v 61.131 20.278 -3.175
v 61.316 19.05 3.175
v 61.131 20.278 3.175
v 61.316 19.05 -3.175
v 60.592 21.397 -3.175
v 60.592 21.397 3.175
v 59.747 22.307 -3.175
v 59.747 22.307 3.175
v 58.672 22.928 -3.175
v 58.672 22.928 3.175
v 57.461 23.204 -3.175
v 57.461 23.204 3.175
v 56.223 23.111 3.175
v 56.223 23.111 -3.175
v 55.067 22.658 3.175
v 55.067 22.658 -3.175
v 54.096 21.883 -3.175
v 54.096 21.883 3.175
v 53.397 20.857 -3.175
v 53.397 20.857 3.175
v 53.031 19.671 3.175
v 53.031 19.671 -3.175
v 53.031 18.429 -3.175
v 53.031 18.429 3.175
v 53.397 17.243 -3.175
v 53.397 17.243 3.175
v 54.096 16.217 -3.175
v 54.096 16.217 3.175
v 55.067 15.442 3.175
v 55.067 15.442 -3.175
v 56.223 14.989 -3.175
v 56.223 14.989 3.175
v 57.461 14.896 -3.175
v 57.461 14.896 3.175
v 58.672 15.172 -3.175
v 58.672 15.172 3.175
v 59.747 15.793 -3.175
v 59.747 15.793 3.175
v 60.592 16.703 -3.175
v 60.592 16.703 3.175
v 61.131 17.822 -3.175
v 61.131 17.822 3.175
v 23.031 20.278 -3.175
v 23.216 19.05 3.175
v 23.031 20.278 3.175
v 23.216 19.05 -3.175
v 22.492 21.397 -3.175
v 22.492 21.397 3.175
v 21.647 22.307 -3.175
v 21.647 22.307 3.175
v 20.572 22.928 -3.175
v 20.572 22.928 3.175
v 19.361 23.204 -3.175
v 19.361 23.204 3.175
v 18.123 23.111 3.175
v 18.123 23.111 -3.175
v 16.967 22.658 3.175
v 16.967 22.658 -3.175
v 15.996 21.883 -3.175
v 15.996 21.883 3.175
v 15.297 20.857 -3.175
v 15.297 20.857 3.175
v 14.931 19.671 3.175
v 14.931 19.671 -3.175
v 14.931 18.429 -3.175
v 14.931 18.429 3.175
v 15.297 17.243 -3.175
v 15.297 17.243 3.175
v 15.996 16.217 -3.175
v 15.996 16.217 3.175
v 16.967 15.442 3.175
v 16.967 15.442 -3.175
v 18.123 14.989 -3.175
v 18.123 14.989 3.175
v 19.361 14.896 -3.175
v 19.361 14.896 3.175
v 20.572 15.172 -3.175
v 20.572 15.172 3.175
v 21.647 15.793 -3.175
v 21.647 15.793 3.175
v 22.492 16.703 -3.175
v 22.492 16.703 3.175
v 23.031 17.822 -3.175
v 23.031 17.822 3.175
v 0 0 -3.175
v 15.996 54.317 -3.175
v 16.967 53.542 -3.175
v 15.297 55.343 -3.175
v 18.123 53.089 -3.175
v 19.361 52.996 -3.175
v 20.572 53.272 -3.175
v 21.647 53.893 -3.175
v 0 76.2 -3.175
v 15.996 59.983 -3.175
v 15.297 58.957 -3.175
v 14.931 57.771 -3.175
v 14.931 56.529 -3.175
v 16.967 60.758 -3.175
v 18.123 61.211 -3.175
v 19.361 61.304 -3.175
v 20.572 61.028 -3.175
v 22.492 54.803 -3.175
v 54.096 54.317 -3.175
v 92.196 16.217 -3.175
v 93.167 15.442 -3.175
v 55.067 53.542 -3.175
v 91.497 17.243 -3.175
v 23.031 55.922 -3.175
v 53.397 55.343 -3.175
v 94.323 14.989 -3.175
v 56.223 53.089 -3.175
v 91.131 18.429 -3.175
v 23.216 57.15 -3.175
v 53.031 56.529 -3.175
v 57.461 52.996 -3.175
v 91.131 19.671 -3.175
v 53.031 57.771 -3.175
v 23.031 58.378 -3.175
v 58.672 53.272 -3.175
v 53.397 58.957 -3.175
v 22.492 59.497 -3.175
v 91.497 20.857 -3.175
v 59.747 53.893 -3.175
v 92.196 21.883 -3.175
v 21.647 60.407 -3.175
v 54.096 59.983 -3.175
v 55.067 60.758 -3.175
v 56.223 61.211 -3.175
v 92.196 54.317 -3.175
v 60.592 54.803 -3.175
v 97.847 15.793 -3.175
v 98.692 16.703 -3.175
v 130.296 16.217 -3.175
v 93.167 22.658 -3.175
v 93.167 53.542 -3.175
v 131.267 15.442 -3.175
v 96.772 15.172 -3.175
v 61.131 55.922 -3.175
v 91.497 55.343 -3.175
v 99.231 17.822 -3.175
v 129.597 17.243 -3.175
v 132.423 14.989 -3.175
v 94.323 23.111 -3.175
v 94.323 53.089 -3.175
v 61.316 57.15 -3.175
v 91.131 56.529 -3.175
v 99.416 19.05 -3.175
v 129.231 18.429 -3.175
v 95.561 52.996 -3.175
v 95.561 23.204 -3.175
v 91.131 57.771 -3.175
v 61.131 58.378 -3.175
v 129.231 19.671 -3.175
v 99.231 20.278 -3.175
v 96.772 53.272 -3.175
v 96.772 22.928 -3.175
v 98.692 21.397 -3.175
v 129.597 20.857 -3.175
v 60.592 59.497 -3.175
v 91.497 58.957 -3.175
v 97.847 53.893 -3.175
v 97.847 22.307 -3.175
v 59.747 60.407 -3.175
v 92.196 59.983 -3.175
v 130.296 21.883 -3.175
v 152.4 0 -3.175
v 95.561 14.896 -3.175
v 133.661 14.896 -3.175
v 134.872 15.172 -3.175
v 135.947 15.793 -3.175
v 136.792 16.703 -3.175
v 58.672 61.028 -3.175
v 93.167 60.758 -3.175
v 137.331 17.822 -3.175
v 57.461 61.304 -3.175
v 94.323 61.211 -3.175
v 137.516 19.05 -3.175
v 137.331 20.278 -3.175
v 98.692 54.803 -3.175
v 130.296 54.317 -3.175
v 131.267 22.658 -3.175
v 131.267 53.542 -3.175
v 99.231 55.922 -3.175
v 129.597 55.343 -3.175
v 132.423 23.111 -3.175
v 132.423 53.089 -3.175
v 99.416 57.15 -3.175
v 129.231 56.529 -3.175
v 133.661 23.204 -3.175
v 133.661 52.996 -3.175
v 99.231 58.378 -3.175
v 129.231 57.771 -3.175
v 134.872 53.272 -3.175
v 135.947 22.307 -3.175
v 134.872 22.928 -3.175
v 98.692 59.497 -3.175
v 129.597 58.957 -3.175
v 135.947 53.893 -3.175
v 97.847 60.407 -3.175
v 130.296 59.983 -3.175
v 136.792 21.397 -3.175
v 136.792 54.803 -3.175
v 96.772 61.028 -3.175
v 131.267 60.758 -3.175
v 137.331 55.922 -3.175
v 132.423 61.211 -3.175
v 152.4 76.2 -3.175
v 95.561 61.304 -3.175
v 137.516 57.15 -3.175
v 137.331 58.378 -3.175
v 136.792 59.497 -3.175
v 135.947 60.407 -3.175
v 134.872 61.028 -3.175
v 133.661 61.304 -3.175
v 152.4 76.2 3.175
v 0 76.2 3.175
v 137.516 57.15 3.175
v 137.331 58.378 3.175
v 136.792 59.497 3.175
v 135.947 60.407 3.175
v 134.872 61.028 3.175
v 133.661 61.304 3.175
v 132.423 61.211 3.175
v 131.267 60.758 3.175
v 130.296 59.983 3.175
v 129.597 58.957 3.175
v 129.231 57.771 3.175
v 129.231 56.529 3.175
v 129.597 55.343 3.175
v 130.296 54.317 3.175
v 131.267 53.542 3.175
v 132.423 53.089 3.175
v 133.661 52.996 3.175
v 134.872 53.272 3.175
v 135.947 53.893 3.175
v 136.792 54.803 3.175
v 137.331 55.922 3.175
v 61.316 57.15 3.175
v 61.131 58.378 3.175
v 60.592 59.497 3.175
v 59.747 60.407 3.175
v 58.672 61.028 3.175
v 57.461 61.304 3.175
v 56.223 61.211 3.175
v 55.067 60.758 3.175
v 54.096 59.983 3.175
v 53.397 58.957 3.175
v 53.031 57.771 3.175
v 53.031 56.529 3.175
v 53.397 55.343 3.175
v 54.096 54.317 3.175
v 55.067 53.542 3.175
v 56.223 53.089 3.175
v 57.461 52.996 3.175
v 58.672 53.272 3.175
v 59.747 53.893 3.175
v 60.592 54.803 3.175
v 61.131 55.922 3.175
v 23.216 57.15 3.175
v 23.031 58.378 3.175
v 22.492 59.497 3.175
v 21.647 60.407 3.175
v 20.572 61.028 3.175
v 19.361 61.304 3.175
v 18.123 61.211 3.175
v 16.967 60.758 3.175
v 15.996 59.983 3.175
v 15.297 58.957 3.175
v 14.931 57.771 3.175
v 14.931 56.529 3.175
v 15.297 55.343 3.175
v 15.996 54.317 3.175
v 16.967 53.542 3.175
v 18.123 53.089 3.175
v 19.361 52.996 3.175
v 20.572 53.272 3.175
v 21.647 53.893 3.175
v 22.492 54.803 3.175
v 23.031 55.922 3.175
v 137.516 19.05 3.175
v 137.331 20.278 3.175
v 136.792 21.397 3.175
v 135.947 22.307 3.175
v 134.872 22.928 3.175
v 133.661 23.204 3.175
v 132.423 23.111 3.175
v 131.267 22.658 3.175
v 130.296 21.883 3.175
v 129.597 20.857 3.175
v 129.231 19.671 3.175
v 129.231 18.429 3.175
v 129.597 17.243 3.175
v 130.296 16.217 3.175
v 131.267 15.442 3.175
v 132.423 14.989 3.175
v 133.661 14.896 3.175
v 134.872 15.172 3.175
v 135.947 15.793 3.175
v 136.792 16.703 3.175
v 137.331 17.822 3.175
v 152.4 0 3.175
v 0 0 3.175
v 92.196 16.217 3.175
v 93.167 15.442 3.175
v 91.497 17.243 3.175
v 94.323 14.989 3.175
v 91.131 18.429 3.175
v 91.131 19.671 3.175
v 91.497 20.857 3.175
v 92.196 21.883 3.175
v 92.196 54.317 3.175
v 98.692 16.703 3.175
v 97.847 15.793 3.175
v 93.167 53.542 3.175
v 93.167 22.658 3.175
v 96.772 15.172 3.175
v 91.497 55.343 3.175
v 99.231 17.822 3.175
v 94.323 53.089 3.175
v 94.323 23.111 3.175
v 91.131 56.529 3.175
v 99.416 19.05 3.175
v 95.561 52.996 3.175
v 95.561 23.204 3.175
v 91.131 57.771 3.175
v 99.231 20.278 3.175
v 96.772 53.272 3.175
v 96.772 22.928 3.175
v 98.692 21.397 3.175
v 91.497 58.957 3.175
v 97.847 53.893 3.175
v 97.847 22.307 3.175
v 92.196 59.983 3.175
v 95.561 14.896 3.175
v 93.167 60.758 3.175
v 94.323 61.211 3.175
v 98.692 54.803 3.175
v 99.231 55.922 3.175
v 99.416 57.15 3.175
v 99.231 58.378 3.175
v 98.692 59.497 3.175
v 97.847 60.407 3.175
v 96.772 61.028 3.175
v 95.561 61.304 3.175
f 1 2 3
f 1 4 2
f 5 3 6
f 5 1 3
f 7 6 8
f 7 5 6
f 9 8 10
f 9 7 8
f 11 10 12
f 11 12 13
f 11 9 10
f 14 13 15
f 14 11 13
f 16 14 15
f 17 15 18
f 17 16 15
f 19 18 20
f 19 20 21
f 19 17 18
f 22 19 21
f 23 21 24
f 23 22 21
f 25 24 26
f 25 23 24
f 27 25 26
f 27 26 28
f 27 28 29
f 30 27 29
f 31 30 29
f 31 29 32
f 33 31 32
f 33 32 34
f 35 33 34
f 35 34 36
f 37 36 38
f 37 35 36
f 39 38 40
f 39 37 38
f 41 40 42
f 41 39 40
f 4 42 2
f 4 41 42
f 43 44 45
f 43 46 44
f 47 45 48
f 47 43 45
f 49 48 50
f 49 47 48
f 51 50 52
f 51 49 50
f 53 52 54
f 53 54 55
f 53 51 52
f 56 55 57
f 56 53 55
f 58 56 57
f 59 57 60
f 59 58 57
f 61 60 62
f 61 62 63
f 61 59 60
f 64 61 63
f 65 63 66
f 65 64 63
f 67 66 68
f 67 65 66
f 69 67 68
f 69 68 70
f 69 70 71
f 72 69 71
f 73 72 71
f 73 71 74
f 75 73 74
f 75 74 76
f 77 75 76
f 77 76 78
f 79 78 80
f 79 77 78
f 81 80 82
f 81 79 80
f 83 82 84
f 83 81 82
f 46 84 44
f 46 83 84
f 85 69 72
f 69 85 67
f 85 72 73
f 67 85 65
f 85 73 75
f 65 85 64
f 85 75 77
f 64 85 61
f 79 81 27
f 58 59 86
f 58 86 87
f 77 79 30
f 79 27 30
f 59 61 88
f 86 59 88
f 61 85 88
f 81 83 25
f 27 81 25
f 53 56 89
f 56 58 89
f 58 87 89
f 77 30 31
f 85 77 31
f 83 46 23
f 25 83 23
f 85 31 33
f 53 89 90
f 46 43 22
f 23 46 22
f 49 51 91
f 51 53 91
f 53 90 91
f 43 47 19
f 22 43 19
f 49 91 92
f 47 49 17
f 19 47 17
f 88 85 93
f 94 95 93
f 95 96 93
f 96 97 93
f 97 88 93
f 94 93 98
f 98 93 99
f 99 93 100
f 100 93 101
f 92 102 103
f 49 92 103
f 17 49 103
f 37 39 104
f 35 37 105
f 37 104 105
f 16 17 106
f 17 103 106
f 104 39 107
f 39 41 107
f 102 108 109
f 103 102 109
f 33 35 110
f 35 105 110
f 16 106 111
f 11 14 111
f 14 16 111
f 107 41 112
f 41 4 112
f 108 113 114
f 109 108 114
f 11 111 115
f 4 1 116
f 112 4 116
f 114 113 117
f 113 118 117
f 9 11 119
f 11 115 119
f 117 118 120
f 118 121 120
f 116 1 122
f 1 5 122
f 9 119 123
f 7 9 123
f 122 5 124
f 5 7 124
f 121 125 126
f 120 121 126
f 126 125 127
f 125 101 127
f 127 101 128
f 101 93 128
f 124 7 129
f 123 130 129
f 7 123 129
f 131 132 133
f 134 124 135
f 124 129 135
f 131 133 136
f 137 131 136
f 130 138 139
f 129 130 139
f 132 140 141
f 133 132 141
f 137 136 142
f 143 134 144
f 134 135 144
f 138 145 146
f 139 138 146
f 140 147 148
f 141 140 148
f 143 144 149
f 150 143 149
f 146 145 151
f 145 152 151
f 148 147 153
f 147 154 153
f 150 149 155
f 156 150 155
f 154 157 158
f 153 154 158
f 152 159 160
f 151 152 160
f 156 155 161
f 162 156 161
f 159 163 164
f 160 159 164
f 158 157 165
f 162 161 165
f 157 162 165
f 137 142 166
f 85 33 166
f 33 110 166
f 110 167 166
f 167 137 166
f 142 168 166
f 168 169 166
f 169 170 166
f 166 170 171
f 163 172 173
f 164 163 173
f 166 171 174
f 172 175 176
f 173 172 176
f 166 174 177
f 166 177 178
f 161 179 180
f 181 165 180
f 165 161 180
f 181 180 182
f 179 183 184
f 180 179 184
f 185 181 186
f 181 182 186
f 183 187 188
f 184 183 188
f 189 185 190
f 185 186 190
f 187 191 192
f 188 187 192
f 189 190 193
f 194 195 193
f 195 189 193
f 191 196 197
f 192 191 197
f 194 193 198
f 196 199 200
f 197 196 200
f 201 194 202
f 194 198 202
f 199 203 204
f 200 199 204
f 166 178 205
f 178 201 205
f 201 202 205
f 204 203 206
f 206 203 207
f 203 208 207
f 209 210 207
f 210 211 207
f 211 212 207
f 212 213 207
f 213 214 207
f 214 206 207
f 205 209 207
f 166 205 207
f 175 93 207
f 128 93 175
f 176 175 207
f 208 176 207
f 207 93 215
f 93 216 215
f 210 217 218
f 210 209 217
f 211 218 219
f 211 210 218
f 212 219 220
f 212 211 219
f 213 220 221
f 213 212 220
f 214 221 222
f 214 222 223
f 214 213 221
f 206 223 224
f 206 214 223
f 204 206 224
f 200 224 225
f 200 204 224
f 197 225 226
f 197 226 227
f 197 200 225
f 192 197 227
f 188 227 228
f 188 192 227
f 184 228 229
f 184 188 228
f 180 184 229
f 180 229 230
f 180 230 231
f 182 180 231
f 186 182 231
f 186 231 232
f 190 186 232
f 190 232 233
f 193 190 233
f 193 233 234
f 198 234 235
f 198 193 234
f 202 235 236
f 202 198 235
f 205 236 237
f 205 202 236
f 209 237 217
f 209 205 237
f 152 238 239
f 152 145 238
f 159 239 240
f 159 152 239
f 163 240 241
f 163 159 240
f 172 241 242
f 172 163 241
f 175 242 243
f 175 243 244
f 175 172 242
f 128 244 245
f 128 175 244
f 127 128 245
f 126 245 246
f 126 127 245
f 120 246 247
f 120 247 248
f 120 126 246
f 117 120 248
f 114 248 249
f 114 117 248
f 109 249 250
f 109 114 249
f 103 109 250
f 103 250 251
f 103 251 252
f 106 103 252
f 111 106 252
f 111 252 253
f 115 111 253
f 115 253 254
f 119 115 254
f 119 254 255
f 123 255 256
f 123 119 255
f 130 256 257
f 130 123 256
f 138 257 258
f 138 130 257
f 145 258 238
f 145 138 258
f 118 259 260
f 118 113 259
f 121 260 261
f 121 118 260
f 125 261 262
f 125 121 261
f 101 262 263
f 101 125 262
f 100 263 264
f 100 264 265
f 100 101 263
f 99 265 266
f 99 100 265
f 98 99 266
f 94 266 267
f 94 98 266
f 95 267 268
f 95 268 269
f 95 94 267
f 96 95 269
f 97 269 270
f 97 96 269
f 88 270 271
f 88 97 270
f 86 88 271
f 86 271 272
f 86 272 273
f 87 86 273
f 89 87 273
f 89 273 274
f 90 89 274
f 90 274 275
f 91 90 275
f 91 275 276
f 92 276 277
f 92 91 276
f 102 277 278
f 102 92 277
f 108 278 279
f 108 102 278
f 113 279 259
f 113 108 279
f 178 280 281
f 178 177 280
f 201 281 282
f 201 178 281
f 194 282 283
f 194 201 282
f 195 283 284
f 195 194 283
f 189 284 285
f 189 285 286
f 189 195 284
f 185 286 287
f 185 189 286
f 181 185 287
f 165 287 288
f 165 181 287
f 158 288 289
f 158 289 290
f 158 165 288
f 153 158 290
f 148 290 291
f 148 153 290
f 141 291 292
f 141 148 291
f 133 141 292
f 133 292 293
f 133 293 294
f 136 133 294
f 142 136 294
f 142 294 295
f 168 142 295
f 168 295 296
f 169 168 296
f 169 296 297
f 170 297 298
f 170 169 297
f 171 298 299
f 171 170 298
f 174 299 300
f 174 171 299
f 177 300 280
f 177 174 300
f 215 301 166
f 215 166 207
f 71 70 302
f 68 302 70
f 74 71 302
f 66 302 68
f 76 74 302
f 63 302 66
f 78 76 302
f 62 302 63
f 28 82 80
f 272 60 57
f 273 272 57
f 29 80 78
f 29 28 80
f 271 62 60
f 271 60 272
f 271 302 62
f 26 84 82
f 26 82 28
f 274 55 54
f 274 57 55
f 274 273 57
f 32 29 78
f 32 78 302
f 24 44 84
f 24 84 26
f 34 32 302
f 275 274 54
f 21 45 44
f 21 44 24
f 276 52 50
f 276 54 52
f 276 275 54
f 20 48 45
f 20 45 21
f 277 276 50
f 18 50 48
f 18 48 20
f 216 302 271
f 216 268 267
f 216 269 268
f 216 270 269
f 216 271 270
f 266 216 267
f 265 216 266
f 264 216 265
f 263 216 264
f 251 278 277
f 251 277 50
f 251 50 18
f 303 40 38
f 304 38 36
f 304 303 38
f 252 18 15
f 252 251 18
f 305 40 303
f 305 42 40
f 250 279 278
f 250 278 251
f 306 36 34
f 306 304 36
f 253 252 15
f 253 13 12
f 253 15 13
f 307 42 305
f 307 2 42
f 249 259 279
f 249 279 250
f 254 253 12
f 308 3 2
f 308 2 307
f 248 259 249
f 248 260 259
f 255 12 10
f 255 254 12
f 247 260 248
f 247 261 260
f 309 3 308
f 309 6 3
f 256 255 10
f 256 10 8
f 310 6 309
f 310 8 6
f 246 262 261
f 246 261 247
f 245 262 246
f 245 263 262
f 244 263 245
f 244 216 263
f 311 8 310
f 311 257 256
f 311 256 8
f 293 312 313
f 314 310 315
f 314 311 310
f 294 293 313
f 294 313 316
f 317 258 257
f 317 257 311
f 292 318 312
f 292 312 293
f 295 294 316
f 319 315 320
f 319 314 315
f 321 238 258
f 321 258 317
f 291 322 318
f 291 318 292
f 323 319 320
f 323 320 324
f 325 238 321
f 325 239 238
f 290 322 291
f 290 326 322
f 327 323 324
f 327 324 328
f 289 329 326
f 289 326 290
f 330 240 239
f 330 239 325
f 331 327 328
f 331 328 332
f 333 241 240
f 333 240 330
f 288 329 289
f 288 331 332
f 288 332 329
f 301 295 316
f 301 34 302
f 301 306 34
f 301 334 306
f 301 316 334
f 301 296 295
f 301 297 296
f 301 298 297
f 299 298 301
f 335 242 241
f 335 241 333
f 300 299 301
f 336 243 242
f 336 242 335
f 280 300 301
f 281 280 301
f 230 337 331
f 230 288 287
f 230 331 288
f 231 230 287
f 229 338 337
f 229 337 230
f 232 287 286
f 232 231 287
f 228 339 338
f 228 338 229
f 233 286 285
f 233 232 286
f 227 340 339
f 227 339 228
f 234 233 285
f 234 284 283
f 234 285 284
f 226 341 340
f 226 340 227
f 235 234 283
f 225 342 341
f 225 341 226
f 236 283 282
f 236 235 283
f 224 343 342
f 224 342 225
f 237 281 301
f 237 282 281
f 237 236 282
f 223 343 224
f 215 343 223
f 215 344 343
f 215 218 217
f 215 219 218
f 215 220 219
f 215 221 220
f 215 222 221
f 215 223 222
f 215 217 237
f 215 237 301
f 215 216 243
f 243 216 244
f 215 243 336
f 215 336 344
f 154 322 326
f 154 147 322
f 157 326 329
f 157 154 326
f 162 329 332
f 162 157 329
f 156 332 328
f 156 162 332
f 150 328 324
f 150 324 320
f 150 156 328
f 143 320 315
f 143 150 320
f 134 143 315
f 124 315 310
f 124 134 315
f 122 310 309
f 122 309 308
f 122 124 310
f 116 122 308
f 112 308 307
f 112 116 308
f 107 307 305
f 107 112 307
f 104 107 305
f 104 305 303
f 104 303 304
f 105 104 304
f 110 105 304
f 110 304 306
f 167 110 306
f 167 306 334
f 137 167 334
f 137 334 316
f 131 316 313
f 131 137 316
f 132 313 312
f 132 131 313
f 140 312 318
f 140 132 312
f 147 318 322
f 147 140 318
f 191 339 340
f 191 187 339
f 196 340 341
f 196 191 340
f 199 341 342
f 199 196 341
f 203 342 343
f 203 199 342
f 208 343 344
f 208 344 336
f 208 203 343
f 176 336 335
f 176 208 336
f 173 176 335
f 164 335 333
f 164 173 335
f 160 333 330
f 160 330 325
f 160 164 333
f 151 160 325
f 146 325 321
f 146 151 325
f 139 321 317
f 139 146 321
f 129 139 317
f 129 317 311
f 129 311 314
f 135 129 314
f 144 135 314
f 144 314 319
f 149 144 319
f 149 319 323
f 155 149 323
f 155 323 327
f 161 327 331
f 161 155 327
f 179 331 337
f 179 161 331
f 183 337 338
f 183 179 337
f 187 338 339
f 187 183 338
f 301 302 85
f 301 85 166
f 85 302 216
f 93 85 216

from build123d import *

# Parameters (mm, degrees)
SKETCH1_W           = 152.4
SKETCH1_H           = 76.2
SKETCH1_R           = 4.1656
BOSS_EXTRUDE1_DEPTH = 3.175


with BuildPart() as part:
    # Sketch1 → Boss-Extrude1 (new body, symmetric)
    with BuildSketch(Plane.XY):
        with Locations((76.2, 38.1)):
            Rectangle(SKETCH1_W, SKETCH1_H)
        with Locations((19.05, 19.05)):
            Circle(SKETCH1_R, mode=Mode.SUBTRACT)
        with Locations((57.15, 19.05)):
            Circle(SKETCH1_R, mode=Mode.SUBTRACT)
        with Locations((95.25, 19.05)):
            Circle(SKETCH1_R, mode=Mode.SUBTRACT)
        with Locations((133.35, 19.05)):
            Circle(SKETCH1_R, mode=Mode.SUBTRACT)
        with Locations((19.05, 57.15)):
            Circle(SKETCH1_R, mode=Mode.SUBTRACT)
        with Locations((57.15, 57.15)):
            Circle(SKETCH1_R, mode=Mode.SUBTRACT)
        with Locations((95.25, 57.15)):
            Circle(SKETCH1_R, mode=Mode.SUBTRACT)
        with Locations((133.35, 57.15)):
            Circle(SKETCH1_R, mode=Mode.SUBTRACT)
    extrude(amount=BOSS_EXTRUDE1_DEPTH, both=True)


solid = part.part
